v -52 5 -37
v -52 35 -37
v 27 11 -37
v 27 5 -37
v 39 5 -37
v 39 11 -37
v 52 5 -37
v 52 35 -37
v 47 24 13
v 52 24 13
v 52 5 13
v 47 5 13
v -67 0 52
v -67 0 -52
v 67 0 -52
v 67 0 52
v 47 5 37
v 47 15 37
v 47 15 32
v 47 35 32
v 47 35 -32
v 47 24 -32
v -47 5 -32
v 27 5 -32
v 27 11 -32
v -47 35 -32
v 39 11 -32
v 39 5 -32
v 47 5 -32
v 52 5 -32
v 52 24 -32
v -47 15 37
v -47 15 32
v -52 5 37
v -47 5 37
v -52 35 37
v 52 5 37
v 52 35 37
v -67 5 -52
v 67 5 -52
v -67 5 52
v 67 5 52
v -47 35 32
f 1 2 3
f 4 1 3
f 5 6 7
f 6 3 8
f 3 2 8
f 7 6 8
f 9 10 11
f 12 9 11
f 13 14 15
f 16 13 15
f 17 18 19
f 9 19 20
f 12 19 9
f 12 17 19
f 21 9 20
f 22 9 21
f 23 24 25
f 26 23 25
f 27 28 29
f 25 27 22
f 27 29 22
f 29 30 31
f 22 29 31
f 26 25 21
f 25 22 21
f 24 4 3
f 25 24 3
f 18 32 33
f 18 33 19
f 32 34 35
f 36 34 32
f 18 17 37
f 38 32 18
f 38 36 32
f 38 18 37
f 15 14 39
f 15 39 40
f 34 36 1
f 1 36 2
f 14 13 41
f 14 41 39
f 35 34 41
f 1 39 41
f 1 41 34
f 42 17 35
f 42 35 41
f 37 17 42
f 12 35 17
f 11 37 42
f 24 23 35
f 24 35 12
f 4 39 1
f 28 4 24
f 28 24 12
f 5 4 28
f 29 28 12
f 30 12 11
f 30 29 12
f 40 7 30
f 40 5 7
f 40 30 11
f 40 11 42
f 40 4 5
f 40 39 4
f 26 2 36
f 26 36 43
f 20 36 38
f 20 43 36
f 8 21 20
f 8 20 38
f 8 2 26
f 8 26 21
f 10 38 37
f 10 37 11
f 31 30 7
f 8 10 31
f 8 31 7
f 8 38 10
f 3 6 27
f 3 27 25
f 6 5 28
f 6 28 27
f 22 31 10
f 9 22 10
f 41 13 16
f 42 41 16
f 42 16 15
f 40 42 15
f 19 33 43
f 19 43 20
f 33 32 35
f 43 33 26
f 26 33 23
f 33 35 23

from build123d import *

# Parameters (mm, degrees)
SKETCH3_W           = 134
SKETCH3_H           = 104
SKETCH3_W_2         = 94
SKETCH3_H_2         = 64
BOSS_EXTRUDE2_DEPTH = 35
SKETCH3_6_W         = 94
SKETCH3_6_H         = 64
BOSS_EXTRUDE3_DEPTH = 5
SKETCH8_W           = 134
SKETCH8_H           = 104
SKETCH8_W_2         = 104
SKETCH8_H_2         = 74
CUT_EXTRUDE3_DEPTH  = 30
CUT_EXTRUDE4_DEPTH  = 114
SKETCH9_W           = 94
SKETCH9_H           = 10
CUT_EXTRUDE5_DEPTH  = 5
SKETCH10_W          = 17
SKETCH10_H          = 10
CUT_EXTRUDE6_DEPTH  = 5
SKETCH11_W          = 28.983298244
SKETCH11_H          = 12.432282013
BOSS_EXTRUDE4_DEPTH = 5
SKETCH13_W          = 12
SKETCH13_H          = 6
CUT_EXTRUDE7_DEPTH  = 10


with BuildPart() as part:
    # Sketch3 → Boss-Extrude2 (new body)
    with BuildSketch(Plane(origin=(0, 0, 0), x_dir=(1, 0, 0), z_dir=(0, 1, 0))):
        Rectangle(SKETCH3_W, SKETCH3_H)
        Rectangle(SKETCH3_W_2, SKETCH3_H_2, mode=Mode.SUBTRACT)
    extrude(amount=BOSS_EXTRUDE2_DEPTH)

    # Sketch3<6> → Boss-Extrude3 (add)
    with BuildSketch(Plane(origin=(0, 0, 0), x_dir=(1, 0, 0), z_dir=(0, 1, 0))):
        Rectangle(SKETCH3_6_W, SKETCH3_6_H)
    extrude(amount=BOSS_EXTRUDE3_DEPTH)

    # Sketch8 → Cut-Extrude3 (cut)
    with BuildSketch(Plane(origin=(0, 35, 0), x_dir=(1, 0, 0), z_dir=(0, 1, 0))):
        Rectangle(SKETCH8_W, SKETCH8_H)
        Rectangle(SKETCH8_W_2, SKETCH8_H_2, mode=Mode.SUBTRACT)
    extrude(amount=-CUT_EXTRUDE3_DEPTH, mode=Mode.SUBTRACT)

    # Sketch5 → Cut-Extrude4 (cut)
    with BuildSketch(Plane(origin=(67, 0, 0), x_dir=(0, 0, -1), z_dir=(1, 0, 0))):
        Polygon((32, 5.263033051), (32, 24), (-13, 24), (-13, 5), (32, 5), align=None)
    extrude(amount=-CUT_EXTRUDE4_DEPTH, mode=Mode.SUBTRACT)

    # Sketch9 → Cut-Extrude5 (cut)
    with BuildSketch(Plane.XY.offset(37)):
        with Locations((0, 10)):
            Rectangle(SKETCH9_W, SKETCH9_H)
    extrude(amount=-CUT_EXTRUDE5_DEPTH, mode=Mode.SUBTRACT)

    # Sketch10 → Cut-Extrude6 (cut)
    with BuildSketch(Plane(origin=(0, 0, -37), x_dir=(-1, 0, 0), z_dir=(0, 0, -1))):
        with Locations((-38.5, 10)):
            Rectangle(SKETCH10_W, SKETCH10_H)
    extrude(amount=-CUT_EXTRUDE6_DEPTH, mode=Mode.SUBTRACT)

    # Sketch11 → Boss-Extrude4 (add)
    with BuildSketch(Plane(origin=(0, 0, -37), x_dir=(-1, 0, 0), z_dir=(0, 0, -1))):
        with Locations((-34.333019182, 11.216141007)):
            Rectangle(SKETCH11_W, SKETCH11_H)
    extrude(amount=-BOSS_EXTRUDE4_DEPTH)

    # Sketch13 → Cut-Extrude7 (cut)
    with BuildSketch(Plane(origin=(0, 0, -37), x_dir=(-1, 0, 0), z_dir=(0, 0, -1))):
        with Locations((-33, 8)):
            Rectangle(SKETCH13_W, SKETCH13_H)
    extrude(amount=-CUT_EXTRUDE7_DEPTH, mode=Mode.SUBTRACT)


solid = part.part
